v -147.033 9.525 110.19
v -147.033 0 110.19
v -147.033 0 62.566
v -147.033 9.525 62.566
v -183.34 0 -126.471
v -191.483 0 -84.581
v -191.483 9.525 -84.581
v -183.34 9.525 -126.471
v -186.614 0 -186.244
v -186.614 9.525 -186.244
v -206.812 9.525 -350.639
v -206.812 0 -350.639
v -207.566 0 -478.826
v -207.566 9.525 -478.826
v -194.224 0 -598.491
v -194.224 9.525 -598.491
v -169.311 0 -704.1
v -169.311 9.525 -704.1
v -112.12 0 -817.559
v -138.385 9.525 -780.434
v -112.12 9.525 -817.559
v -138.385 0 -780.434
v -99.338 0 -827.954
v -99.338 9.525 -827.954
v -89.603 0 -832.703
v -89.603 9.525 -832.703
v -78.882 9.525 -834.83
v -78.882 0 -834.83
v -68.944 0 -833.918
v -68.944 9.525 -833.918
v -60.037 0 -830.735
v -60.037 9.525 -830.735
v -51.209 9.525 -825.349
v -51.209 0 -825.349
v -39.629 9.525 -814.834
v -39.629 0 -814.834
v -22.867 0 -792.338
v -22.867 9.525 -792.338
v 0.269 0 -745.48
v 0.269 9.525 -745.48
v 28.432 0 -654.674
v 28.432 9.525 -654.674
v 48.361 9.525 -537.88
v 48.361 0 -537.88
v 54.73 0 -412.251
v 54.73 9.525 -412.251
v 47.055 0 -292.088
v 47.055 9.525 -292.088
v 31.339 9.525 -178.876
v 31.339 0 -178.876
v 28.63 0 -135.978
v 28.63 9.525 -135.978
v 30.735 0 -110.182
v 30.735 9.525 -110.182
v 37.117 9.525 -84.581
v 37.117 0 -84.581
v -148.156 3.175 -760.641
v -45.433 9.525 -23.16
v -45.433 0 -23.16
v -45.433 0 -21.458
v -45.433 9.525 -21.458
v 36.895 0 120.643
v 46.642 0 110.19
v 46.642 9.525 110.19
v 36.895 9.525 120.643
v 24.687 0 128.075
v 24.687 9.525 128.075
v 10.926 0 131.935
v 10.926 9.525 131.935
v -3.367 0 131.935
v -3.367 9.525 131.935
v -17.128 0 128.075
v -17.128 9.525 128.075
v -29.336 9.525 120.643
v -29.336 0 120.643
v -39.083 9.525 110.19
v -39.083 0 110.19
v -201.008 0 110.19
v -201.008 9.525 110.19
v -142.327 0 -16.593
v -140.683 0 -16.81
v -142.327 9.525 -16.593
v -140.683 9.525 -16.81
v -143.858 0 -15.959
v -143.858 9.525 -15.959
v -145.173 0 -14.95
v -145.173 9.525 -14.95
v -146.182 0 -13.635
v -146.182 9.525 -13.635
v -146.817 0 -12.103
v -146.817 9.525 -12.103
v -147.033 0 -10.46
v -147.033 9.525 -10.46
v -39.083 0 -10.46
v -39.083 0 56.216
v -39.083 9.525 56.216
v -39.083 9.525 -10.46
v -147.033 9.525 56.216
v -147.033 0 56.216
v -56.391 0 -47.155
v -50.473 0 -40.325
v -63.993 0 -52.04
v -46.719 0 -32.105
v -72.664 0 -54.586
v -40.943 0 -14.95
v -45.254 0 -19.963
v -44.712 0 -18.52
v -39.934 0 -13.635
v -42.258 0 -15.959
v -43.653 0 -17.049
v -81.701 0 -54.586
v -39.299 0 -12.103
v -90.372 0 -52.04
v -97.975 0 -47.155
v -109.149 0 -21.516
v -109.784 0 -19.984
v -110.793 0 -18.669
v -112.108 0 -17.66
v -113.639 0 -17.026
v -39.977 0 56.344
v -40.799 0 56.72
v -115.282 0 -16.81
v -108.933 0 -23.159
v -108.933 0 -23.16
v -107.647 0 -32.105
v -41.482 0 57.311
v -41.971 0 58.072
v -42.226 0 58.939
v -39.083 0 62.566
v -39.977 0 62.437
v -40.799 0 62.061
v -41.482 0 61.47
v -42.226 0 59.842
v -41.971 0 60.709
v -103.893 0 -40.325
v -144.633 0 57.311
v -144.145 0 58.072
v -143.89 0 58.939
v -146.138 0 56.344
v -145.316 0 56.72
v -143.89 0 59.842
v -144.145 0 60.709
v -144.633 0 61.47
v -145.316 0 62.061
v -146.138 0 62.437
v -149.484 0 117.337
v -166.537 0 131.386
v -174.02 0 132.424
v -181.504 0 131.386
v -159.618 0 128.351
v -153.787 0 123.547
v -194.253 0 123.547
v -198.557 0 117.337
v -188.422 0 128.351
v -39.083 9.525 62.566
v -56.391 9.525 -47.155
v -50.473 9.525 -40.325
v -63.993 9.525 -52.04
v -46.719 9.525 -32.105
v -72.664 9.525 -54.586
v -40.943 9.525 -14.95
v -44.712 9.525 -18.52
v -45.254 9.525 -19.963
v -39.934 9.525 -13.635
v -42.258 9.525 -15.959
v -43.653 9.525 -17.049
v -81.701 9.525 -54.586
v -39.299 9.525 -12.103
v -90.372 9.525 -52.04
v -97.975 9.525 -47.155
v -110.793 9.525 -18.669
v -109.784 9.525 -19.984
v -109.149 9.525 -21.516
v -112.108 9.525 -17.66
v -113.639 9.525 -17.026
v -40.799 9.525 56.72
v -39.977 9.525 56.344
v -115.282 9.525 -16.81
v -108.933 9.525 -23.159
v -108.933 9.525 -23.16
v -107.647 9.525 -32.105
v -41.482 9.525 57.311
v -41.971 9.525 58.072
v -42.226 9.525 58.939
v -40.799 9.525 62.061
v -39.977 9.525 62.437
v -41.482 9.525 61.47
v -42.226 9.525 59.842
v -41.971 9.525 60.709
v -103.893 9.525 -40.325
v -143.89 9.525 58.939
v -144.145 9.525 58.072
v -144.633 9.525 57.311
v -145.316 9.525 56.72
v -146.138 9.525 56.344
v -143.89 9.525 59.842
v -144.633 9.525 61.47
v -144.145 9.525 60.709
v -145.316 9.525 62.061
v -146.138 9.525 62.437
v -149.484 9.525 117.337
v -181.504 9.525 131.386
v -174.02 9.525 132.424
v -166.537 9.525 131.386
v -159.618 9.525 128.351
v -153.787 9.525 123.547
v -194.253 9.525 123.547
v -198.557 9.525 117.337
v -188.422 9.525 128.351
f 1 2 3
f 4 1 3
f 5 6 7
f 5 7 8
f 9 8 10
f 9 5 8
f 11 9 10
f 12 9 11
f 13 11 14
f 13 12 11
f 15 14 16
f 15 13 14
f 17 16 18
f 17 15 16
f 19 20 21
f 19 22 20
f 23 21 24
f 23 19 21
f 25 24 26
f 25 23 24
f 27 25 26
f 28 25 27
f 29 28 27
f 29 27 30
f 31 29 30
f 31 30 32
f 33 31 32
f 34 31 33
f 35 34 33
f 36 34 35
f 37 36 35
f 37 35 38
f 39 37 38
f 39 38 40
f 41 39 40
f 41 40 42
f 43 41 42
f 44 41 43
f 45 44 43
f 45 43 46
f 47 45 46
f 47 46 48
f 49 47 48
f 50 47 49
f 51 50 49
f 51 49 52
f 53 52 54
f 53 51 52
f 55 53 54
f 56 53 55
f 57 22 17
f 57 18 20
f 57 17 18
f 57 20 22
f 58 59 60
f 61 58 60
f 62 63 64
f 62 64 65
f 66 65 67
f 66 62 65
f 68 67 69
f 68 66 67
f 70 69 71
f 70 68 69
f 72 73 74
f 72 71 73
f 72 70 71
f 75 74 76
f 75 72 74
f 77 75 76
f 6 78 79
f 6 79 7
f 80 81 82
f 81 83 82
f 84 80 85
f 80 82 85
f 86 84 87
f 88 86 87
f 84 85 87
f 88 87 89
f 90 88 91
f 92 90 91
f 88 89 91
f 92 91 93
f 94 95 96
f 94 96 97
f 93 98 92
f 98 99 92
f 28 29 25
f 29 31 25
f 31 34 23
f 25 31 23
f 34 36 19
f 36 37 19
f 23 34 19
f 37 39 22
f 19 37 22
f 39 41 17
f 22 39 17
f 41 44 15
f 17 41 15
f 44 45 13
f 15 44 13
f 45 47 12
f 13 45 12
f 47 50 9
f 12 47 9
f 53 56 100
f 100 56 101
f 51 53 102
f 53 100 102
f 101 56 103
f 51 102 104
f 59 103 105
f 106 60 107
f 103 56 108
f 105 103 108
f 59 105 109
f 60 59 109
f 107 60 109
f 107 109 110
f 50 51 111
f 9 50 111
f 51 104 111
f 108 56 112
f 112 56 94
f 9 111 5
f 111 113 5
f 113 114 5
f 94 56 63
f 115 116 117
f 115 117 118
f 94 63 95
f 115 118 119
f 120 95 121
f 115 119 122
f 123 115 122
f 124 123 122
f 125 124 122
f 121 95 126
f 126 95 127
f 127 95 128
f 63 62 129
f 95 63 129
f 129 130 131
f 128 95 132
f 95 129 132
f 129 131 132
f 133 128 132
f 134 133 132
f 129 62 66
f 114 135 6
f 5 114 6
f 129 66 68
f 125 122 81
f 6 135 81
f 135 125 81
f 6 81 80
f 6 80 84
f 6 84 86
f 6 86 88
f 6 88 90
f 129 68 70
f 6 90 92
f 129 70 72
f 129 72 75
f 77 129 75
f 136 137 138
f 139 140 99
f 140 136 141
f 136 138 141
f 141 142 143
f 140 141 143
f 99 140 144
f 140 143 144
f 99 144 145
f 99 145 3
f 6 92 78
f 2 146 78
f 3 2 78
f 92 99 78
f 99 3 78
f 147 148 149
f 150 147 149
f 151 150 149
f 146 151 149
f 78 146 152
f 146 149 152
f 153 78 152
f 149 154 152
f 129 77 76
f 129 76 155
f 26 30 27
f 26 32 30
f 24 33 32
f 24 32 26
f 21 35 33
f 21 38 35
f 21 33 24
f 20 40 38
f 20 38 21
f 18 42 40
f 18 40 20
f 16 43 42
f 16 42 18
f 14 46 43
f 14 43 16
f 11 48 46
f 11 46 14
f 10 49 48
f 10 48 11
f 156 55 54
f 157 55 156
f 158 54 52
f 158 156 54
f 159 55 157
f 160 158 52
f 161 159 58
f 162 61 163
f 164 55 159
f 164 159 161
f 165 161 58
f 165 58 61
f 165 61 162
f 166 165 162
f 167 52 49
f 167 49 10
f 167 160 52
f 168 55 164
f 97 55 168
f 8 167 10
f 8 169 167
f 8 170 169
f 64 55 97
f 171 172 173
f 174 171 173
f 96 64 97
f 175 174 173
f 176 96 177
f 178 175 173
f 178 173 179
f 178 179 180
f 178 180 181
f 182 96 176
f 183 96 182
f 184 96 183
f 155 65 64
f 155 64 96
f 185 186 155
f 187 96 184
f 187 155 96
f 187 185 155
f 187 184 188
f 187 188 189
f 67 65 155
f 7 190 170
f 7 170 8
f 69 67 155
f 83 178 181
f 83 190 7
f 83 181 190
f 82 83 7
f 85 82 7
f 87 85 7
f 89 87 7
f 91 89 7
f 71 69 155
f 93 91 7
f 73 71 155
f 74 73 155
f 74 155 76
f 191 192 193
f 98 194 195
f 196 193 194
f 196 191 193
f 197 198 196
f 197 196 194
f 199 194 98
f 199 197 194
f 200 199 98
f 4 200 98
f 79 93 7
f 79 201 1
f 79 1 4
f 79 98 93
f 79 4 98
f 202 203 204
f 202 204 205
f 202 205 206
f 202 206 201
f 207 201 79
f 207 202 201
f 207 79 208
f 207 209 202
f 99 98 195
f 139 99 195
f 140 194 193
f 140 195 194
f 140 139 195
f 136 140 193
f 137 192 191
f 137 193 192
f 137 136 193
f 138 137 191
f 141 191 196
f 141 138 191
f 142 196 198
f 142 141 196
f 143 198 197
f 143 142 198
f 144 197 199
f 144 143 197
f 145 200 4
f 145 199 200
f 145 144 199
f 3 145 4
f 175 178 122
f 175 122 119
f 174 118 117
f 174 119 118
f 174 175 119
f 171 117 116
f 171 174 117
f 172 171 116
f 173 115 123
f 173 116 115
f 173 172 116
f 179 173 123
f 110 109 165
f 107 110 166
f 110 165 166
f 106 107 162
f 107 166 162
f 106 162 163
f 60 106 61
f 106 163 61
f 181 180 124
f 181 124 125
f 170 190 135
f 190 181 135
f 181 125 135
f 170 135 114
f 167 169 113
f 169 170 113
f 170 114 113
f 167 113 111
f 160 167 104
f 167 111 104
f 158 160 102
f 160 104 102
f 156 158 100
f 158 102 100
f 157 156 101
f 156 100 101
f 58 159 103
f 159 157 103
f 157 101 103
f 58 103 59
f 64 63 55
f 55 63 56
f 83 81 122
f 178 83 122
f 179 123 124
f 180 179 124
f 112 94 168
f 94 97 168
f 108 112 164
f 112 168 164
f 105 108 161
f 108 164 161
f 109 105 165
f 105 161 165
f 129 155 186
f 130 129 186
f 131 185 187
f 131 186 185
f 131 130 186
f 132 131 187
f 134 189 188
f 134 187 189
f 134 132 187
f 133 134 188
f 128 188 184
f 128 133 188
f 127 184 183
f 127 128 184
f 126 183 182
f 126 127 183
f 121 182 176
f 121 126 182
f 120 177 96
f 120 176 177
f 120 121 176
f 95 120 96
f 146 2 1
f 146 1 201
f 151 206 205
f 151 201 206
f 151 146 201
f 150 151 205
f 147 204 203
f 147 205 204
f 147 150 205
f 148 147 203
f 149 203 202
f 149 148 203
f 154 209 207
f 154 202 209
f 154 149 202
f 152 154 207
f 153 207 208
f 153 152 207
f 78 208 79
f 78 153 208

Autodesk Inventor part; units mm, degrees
ref_plane "YZ Plane" through (0, 0, 0) normal (1, 0, 0) x (0, 1, 0)
ref_plane "XZ Plane" through (0, 0, 0) normal (0, 1, 0) x (-1, 0, 0)
ref_plane "XY Plane" through (0, 0, 0) normal (0, 0, 1) x (1, 0, 0)
sketch "Sketch2" plane through (0, 0, 0) normal (0, 1, 0) x (-1, 0, 0)
  line L0 (194.6579, -241.6418) -> (-40.2921, -241.6418) construction
  line L1 (-30.7671, -644.5615) -> (185.1329, -644.5615) construction
  line L2 (147.0329, 110.1905) -> (147.0329, 62.5655)
  line L3 (209.9876, 110.1905) -> (-95.098, 110.1905) construction
  arc A0 (147.0329, 62.5655) -> (147.0329, 56.2155) centre (147.0329, 59.3905) ccw
  line L4 (97.2679, -54.9095) -> (57.0979, -54.9095) construction
  line L5 (97.2679, -54.9095) -> (137.4379, -54.9095) construction
  line L6 (77.1829, -834.8709) -> (77.1829, 198.0101) construction
  line L7 (147.0329, 56.2155) -> (147.0329, -16.8095)
  line L8 (147.0329, 62.5655) -> (147.0329, 56.2155) construction
  line L9 (235, 132.4241) -> (-116.3118, 132.4241) construction
  line L10 (235, 132.4241) -> (586.3118, 132.4241) construction
  arc A1 (39.0829, 56.2155) -> (39.0829, 62.5655) centre (39.0829, 59.3905) ccw
  line L11 (39.0829, 62.5655) -> (39.0829, 56.2155) construction
  line L12 (39.0829, 62.5655) -> (45.4329, 62.5655) construction
  line L13 (39.0829, 56.2155) -> (39.0829, -16.8095)
  line L14 (39.0829, 110.1905) -> (39.0829, 62.5655)
  line L15 (107.9631, -23.1595) -> (33.1393, -23.1595) construction
  line L16 (107.9737, -23.1595) -> (107.9631, -23.1595) construction
  arc A2 (45.4329, -23.1595) -> (108.9329, -23.1595) centre (77.1829, -23.1595) ccw
  line L17 (108.9329, -23.1595) -> (45.4329, -23.1595) construction
  line L18 (108.9329, -23.1595) -> (172.4329, -23.1595) construction
  line L19 (147.0329, -16.8095) -> (108.9329, -16.8095)
  line L20 (108.9329, -16.8095) -> (108.9329, -23.1595)
  line L21 (45.4329, -23.1595) -> (45.4329, -16.8095)
  line L22 (45.4329, -23.1595) -> (51.7829, -23.1595) construction
  line L23 (45.4329, -16.8095) -> (39.0829, -16.8095)
  arc A3 (39.0829, 110.1905) -> (-46.6421, 110.1905) centre (-3.7796, 79.9915) ccw
  arc A4 (201.0079, 110.1905) -> (147.0329, 110.1905) centre (174.0204, 104.9283) ccw
  line L24 (191.4829, -84.5811) -> (-37.1171, -84.5811) construction
  line L25 (201.0079, 110.1905) -> (191.4829, -84.5811)
  line L26 (-46.6421, 110.1905) -> (-37.1171, -84.5811)
  spline S0 degree 4 poles (191.4829, -84.5811) (153.3095, -195.3959) (291.7997, -323.3196) (77.1829, -1372.7001) (-137.4339, -323.3196) (1.0563, -195.3959) (-37.1171, -84.5811) knots 0 0 0 0 0 0.408052 0.591948 1 1 1 1 1
  point P0 (77.1829, -241.6418)
  point P1 (77.1829, -779.6686)
  point P2 (5.0659, 158.3555)
  point P3 (77.1829, -644.5615)
  point P4 (77.1829, -36.1166)
  point P5 (77.1829, -54.9095)
  point P6 (77.1829, -84.5811)
  dimension "d20" = 234.95
  dimension "d37" = 215.9
  dimension "d51" = 6.35
  dimension "d52" = 50.8
  dimension "d60" = 180
  dimension "d61" = 114.3
  dimension "d76" = 180
  dimension "d81" = 6.35
  dimension "d82" = 90
  dimension "d83" = 3.175
  dimension "d84" = 50.8
  dimension "d85" = 69.85
  dimension "d86" = 38.1
  dimension "d98" = 63.5
  dimension "d99" = 180
  dimension "d100" = 31.75
  dimension "d101" = 90
  dimension "d102" = 76.2
  dimension "d106" = 247.65
  dimension "d107" = 123.825
  dimension "d108" = 228.6
extrude "Extrusion2" add sketch "Sketch2" along normal blind 9.525
fillet "Fillet2" radius 6.35 1 edges at (-39.0829, 4.7625, -16.8095)
fillet "Fillet3" radius 6.35 2 edges at (-45.4324, 4.7625, -16.8095) (-45.4329, 4.7625, -16.8095)
fillet "Fillet4" radius 6.35 2 edges at (-108.9329, 4.7625, -16.8095) (-147.0329, 4.7625, -16.8095)
properties part number "Board"
